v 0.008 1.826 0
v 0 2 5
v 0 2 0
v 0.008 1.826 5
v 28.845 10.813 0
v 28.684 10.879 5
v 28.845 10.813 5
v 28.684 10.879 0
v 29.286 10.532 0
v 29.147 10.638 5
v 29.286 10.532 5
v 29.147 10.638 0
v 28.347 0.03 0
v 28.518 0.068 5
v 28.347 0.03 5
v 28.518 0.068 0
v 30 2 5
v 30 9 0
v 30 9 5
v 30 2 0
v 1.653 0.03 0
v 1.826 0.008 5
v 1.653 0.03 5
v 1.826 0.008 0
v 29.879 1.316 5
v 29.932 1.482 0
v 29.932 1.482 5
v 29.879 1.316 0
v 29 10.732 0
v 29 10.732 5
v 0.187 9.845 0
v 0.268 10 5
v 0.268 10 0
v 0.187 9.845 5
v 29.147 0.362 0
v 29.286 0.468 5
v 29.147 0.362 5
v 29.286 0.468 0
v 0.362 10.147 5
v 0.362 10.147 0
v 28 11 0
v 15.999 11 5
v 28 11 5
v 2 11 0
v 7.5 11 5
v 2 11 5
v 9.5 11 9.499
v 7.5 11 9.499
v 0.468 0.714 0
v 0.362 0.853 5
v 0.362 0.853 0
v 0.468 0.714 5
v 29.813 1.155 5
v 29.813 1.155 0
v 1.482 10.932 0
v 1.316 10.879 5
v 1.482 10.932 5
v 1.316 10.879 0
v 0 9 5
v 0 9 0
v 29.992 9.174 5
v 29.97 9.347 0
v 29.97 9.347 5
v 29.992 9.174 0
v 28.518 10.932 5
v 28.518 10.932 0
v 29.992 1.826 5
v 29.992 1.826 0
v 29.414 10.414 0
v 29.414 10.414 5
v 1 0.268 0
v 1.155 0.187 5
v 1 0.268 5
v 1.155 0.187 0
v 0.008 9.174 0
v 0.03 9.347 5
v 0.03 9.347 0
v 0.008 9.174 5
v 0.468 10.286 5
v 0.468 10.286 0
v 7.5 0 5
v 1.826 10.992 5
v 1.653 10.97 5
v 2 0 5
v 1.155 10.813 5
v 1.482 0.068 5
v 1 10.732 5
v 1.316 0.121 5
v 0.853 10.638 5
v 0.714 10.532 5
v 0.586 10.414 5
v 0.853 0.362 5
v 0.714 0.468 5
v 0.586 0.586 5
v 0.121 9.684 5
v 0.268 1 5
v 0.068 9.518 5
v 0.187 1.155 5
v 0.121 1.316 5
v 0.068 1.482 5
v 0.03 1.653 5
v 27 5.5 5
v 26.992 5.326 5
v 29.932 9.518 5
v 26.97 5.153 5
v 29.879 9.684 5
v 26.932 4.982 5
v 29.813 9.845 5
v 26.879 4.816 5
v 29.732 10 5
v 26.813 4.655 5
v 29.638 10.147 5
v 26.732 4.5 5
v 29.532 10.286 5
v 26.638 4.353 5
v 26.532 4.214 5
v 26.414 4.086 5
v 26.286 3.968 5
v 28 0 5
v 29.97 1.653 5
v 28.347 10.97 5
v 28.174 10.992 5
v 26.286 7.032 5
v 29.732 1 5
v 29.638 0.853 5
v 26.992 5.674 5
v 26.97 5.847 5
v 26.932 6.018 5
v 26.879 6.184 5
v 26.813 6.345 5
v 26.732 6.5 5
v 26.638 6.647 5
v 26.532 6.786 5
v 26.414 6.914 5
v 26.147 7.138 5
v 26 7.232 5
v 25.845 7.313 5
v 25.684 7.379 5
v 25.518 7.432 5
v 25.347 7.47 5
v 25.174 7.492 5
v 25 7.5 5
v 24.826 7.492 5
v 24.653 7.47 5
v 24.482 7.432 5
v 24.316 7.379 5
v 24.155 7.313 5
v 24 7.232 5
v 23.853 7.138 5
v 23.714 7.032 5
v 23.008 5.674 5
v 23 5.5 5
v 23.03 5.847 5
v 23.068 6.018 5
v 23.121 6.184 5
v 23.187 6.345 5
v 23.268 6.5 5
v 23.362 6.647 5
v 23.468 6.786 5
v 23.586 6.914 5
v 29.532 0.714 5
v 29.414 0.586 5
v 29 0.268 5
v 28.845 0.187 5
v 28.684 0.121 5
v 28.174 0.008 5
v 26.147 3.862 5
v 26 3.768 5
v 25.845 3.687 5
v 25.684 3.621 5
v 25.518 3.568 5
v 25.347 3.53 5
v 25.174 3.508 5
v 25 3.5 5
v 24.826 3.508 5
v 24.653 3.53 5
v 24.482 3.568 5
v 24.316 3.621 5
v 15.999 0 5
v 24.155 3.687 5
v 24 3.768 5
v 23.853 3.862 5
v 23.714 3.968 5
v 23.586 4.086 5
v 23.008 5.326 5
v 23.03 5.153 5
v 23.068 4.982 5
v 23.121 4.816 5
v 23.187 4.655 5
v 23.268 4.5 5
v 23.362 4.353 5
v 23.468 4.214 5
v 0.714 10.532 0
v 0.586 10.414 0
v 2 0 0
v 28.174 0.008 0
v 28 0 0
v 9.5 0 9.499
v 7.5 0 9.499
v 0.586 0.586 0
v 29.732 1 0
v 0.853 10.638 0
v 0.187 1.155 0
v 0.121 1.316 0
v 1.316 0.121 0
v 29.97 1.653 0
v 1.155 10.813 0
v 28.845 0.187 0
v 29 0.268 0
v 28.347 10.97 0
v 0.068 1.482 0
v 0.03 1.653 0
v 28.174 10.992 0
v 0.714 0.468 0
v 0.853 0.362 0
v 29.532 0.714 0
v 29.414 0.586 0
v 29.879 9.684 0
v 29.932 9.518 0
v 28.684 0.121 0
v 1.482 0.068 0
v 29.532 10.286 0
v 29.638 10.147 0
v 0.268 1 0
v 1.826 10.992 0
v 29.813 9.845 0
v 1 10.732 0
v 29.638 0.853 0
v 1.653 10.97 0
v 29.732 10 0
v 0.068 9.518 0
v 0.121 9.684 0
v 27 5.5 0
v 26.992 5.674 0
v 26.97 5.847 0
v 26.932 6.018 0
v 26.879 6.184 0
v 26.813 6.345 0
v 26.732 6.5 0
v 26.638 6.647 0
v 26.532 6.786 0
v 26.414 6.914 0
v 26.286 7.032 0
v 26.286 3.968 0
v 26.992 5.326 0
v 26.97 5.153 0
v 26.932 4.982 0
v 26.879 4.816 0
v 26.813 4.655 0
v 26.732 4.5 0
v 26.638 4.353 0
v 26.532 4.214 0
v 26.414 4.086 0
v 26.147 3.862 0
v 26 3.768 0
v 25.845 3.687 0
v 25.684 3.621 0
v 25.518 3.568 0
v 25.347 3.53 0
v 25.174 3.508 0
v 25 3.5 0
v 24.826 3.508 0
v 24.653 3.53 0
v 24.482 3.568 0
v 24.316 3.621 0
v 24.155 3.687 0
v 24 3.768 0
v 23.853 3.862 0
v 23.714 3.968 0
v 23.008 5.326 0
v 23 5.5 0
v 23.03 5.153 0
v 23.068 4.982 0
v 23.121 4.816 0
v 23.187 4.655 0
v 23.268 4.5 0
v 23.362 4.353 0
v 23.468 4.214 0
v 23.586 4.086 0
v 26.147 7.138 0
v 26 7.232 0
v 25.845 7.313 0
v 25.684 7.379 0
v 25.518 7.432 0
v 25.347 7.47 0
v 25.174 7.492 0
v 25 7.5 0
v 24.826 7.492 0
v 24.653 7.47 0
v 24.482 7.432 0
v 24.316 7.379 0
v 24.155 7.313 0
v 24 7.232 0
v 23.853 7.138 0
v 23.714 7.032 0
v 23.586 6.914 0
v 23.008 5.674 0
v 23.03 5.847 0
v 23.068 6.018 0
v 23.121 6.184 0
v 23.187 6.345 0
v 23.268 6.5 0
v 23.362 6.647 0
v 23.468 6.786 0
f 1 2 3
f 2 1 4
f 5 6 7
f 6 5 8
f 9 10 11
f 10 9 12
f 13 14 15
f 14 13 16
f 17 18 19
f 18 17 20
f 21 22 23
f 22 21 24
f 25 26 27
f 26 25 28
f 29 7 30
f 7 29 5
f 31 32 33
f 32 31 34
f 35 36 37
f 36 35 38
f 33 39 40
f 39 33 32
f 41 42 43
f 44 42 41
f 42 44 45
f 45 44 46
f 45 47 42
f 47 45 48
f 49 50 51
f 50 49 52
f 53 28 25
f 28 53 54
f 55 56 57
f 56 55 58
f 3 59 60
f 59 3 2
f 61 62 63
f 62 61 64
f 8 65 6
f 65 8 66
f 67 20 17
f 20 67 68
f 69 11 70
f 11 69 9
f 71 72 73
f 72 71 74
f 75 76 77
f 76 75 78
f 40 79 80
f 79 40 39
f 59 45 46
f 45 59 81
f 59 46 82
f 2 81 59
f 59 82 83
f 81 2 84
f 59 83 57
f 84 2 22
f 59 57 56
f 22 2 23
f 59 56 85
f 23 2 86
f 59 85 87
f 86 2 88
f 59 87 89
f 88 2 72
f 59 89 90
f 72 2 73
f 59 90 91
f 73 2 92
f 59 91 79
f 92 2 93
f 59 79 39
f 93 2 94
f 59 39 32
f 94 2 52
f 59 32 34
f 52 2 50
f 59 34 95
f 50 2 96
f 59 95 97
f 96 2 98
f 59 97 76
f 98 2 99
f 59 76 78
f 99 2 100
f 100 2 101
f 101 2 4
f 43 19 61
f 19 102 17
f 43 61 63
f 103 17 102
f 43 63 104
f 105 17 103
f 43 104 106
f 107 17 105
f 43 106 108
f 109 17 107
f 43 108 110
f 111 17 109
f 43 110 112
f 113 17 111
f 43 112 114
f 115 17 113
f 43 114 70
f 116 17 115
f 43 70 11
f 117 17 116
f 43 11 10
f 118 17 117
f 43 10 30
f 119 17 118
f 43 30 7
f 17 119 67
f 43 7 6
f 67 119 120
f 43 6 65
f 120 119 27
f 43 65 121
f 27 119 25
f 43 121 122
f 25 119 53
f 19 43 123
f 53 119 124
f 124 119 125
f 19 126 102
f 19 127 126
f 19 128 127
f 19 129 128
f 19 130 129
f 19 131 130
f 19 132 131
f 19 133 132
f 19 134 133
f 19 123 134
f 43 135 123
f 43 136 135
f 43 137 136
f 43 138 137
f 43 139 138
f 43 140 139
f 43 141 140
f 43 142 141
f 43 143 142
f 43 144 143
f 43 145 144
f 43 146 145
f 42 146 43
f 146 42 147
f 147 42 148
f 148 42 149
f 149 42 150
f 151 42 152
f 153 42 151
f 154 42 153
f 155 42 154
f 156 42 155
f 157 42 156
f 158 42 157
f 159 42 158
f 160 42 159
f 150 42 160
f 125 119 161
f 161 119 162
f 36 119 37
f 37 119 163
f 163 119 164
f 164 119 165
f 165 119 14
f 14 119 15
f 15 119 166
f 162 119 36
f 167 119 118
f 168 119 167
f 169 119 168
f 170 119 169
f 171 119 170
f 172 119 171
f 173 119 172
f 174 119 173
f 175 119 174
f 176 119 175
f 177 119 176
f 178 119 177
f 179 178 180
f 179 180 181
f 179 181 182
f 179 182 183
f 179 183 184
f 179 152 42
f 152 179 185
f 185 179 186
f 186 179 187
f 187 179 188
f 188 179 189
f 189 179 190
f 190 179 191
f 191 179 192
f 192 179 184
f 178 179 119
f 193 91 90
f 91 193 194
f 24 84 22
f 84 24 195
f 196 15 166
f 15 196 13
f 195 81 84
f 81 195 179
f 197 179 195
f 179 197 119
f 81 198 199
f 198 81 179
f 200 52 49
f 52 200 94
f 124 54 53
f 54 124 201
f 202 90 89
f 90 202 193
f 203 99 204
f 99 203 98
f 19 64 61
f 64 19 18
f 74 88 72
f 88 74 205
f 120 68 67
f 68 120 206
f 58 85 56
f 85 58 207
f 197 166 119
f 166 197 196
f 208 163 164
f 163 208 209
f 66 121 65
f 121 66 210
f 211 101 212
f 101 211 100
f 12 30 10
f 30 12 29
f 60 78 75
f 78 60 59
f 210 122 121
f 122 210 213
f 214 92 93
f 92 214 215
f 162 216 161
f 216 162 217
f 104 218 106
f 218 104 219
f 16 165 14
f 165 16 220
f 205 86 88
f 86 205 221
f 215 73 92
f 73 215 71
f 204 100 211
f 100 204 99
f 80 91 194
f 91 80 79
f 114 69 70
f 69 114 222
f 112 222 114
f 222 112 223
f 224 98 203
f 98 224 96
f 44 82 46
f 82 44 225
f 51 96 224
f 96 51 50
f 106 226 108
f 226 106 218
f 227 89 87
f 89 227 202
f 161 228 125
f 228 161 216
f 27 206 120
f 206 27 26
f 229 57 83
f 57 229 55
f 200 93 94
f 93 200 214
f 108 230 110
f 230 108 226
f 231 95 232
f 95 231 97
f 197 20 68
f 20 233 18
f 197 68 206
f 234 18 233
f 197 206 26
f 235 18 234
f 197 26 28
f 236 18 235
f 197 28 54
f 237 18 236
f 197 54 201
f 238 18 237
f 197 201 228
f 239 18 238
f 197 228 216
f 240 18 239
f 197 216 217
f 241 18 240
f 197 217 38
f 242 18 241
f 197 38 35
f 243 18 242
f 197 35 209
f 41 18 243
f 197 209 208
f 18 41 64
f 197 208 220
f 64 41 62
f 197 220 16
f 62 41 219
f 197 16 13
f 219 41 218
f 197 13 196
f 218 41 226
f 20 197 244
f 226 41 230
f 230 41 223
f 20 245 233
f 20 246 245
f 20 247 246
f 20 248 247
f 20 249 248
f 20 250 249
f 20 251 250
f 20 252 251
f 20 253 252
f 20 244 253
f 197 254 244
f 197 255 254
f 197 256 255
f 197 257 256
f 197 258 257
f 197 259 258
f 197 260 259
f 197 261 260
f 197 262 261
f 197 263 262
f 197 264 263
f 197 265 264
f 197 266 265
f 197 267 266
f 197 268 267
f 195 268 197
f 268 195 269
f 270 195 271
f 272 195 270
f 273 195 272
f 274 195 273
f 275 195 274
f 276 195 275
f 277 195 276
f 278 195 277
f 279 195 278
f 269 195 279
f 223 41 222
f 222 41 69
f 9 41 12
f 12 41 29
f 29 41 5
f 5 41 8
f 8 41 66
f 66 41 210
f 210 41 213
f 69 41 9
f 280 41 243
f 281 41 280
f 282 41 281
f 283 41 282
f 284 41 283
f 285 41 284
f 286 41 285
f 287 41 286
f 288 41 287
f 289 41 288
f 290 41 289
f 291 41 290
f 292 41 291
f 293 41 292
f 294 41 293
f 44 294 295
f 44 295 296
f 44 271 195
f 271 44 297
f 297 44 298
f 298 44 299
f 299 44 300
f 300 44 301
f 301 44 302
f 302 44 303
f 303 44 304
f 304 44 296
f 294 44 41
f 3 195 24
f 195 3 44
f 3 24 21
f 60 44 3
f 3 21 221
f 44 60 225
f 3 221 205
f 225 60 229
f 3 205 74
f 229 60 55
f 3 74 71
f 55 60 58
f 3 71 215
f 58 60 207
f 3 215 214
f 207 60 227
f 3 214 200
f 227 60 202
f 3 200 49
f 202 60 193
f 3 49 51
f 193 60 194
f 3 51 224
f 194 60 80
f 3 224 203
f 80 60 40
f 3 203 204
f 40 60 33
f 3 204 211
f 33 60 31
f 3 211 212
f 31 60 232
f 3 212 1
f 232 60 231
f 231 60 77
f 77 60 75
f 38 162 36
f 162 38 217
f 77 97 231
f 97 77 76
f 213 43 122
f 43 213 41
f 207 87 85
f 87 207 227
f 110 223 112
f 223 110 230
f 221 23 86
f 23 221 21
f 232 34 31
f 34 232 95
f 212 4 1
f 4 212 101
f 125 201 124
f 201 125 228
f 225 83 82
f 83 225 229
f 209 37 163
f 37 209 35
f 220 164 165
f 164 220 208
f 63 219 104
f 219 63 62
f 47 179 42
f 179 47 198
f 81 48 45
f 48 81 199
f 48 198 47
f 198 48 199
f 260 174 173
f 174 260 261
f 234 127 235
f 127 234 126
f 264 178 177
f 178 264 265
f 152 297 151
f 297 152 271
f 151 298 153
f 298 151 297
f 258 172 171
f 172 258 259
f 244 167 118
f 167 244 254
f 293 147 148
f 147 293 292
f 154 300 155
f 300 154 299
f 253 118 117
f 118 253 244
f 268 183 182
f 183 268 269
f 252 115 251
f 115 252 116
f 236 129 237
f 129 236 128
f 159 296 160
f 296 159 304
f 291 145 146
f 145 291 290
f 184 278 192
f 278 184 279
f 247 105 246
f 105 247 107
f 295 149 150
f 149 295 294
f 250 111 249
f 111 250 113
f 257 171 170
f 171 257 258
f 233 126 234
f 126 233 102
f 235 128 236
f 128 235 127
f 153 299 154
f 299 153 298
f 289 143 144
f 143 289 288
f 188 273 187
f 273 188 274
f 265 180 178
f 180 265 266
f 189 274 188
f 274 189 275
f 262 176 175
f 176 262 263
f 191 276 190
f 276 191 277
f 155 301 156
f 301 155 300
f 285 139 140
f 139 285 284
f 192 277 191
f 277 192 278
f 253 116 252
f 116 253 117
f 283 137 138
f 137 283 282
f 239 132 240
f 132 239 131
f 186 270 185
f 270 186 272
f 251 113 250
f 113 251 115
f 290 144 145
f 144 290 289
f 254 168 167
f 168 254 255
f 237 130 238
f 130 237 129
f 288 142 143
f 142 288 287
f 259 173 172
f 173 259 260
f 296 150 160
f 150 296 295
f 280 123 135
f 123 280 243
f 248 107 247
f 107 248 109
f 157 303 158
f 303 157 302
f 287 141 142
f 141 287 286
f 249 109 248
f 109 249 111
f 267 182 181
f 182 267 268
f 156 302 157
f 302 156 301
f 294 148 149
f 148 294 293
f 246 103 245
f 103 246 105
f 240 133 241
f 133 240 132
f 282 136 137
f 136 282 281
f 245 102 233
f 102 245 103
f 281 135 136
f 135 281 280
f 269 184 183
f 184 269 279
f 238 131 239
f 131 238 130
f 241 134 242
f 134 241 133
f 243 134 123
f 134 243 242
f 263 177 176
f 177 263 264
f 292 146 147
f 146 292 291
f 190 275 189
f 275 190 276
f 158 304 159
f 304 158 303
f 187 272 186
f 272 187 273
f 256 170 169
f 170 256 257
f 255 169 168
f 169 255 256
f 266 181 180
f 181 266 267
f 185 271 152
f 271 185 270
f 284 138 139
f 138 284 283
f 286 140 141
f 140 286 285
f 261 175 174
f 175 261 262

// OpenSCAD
// Extruder tool for Makerfarm i3v.

// Set to 0 for final STL compilation (slow). Set to 1 for quick
// debugging (lower quality)

/* [Hidden] */

debug = 0;

// Determine the quality of circles (better = slower compilation).
$fn = (debug != 0) ? 12 : 72;

/* [Global] */

// Controls the opening of the extruder.
body_thickness = 5; // [3:8]
// Width.
body_width = 11;   // [5:15]
// Lengnth.
body_length = 30;  // [10:50]
// Size of the stopper.
step_height = 4.5; // [0:6]
// Controls the insertion depth.
step_offset = 7.5;  // [0:15]
// Hole diameter.
hole_diameter = 4;  // [0:8]
// Hole distance from the edge.
hole_offset = 5;  // [0:15]
// Corner rounding radius
body_corner_radius = 2;  // [0:10]

/* [Hidden] */

step_top_length = 2;
step_angle = 45;

// Small >0 dimension to maintain manifold.
eps = 0.001;
eps2 = 2*eps;

// Generic cube with for corners rounded.
module rounded_cube(xlen, ylen, zlen, r) {
  translate([r, r, 0]) minkowski() {
    cube([xlen-2*r, ylen-2*r, zlen/2]);
    cylinder(r=r, h=zlen/2);
 }
}

// The main block.
module body() {
  rounded_cube(body_length, body_width, body_thickness, body_corner_radius);
}

module hole() {
  translate([body_length - hole_offset, body_width/2, -eps]) 
    cylinder(r=hole_diameter/2, h= body_thickness+eps2);
}

// The step above the body.
module step() {
  step_base_length = step_top_length + (step_height / tan(step_angle));
  translate([step_offset, body_width, body_thickness - eps]) 
  rotate([90, 0, 0]) linear_extrude(height=body_width)
      polygon(points=[
          [0,0], 
          [0, step_height], 
          [step_top_length, step_height], 
          [step_top_length + step_base_length, 0]]);
}

// The entire part.
module main() {
  difference() {
    union() {
      body();
      step();
    }
    hole();
  }
}

main();
